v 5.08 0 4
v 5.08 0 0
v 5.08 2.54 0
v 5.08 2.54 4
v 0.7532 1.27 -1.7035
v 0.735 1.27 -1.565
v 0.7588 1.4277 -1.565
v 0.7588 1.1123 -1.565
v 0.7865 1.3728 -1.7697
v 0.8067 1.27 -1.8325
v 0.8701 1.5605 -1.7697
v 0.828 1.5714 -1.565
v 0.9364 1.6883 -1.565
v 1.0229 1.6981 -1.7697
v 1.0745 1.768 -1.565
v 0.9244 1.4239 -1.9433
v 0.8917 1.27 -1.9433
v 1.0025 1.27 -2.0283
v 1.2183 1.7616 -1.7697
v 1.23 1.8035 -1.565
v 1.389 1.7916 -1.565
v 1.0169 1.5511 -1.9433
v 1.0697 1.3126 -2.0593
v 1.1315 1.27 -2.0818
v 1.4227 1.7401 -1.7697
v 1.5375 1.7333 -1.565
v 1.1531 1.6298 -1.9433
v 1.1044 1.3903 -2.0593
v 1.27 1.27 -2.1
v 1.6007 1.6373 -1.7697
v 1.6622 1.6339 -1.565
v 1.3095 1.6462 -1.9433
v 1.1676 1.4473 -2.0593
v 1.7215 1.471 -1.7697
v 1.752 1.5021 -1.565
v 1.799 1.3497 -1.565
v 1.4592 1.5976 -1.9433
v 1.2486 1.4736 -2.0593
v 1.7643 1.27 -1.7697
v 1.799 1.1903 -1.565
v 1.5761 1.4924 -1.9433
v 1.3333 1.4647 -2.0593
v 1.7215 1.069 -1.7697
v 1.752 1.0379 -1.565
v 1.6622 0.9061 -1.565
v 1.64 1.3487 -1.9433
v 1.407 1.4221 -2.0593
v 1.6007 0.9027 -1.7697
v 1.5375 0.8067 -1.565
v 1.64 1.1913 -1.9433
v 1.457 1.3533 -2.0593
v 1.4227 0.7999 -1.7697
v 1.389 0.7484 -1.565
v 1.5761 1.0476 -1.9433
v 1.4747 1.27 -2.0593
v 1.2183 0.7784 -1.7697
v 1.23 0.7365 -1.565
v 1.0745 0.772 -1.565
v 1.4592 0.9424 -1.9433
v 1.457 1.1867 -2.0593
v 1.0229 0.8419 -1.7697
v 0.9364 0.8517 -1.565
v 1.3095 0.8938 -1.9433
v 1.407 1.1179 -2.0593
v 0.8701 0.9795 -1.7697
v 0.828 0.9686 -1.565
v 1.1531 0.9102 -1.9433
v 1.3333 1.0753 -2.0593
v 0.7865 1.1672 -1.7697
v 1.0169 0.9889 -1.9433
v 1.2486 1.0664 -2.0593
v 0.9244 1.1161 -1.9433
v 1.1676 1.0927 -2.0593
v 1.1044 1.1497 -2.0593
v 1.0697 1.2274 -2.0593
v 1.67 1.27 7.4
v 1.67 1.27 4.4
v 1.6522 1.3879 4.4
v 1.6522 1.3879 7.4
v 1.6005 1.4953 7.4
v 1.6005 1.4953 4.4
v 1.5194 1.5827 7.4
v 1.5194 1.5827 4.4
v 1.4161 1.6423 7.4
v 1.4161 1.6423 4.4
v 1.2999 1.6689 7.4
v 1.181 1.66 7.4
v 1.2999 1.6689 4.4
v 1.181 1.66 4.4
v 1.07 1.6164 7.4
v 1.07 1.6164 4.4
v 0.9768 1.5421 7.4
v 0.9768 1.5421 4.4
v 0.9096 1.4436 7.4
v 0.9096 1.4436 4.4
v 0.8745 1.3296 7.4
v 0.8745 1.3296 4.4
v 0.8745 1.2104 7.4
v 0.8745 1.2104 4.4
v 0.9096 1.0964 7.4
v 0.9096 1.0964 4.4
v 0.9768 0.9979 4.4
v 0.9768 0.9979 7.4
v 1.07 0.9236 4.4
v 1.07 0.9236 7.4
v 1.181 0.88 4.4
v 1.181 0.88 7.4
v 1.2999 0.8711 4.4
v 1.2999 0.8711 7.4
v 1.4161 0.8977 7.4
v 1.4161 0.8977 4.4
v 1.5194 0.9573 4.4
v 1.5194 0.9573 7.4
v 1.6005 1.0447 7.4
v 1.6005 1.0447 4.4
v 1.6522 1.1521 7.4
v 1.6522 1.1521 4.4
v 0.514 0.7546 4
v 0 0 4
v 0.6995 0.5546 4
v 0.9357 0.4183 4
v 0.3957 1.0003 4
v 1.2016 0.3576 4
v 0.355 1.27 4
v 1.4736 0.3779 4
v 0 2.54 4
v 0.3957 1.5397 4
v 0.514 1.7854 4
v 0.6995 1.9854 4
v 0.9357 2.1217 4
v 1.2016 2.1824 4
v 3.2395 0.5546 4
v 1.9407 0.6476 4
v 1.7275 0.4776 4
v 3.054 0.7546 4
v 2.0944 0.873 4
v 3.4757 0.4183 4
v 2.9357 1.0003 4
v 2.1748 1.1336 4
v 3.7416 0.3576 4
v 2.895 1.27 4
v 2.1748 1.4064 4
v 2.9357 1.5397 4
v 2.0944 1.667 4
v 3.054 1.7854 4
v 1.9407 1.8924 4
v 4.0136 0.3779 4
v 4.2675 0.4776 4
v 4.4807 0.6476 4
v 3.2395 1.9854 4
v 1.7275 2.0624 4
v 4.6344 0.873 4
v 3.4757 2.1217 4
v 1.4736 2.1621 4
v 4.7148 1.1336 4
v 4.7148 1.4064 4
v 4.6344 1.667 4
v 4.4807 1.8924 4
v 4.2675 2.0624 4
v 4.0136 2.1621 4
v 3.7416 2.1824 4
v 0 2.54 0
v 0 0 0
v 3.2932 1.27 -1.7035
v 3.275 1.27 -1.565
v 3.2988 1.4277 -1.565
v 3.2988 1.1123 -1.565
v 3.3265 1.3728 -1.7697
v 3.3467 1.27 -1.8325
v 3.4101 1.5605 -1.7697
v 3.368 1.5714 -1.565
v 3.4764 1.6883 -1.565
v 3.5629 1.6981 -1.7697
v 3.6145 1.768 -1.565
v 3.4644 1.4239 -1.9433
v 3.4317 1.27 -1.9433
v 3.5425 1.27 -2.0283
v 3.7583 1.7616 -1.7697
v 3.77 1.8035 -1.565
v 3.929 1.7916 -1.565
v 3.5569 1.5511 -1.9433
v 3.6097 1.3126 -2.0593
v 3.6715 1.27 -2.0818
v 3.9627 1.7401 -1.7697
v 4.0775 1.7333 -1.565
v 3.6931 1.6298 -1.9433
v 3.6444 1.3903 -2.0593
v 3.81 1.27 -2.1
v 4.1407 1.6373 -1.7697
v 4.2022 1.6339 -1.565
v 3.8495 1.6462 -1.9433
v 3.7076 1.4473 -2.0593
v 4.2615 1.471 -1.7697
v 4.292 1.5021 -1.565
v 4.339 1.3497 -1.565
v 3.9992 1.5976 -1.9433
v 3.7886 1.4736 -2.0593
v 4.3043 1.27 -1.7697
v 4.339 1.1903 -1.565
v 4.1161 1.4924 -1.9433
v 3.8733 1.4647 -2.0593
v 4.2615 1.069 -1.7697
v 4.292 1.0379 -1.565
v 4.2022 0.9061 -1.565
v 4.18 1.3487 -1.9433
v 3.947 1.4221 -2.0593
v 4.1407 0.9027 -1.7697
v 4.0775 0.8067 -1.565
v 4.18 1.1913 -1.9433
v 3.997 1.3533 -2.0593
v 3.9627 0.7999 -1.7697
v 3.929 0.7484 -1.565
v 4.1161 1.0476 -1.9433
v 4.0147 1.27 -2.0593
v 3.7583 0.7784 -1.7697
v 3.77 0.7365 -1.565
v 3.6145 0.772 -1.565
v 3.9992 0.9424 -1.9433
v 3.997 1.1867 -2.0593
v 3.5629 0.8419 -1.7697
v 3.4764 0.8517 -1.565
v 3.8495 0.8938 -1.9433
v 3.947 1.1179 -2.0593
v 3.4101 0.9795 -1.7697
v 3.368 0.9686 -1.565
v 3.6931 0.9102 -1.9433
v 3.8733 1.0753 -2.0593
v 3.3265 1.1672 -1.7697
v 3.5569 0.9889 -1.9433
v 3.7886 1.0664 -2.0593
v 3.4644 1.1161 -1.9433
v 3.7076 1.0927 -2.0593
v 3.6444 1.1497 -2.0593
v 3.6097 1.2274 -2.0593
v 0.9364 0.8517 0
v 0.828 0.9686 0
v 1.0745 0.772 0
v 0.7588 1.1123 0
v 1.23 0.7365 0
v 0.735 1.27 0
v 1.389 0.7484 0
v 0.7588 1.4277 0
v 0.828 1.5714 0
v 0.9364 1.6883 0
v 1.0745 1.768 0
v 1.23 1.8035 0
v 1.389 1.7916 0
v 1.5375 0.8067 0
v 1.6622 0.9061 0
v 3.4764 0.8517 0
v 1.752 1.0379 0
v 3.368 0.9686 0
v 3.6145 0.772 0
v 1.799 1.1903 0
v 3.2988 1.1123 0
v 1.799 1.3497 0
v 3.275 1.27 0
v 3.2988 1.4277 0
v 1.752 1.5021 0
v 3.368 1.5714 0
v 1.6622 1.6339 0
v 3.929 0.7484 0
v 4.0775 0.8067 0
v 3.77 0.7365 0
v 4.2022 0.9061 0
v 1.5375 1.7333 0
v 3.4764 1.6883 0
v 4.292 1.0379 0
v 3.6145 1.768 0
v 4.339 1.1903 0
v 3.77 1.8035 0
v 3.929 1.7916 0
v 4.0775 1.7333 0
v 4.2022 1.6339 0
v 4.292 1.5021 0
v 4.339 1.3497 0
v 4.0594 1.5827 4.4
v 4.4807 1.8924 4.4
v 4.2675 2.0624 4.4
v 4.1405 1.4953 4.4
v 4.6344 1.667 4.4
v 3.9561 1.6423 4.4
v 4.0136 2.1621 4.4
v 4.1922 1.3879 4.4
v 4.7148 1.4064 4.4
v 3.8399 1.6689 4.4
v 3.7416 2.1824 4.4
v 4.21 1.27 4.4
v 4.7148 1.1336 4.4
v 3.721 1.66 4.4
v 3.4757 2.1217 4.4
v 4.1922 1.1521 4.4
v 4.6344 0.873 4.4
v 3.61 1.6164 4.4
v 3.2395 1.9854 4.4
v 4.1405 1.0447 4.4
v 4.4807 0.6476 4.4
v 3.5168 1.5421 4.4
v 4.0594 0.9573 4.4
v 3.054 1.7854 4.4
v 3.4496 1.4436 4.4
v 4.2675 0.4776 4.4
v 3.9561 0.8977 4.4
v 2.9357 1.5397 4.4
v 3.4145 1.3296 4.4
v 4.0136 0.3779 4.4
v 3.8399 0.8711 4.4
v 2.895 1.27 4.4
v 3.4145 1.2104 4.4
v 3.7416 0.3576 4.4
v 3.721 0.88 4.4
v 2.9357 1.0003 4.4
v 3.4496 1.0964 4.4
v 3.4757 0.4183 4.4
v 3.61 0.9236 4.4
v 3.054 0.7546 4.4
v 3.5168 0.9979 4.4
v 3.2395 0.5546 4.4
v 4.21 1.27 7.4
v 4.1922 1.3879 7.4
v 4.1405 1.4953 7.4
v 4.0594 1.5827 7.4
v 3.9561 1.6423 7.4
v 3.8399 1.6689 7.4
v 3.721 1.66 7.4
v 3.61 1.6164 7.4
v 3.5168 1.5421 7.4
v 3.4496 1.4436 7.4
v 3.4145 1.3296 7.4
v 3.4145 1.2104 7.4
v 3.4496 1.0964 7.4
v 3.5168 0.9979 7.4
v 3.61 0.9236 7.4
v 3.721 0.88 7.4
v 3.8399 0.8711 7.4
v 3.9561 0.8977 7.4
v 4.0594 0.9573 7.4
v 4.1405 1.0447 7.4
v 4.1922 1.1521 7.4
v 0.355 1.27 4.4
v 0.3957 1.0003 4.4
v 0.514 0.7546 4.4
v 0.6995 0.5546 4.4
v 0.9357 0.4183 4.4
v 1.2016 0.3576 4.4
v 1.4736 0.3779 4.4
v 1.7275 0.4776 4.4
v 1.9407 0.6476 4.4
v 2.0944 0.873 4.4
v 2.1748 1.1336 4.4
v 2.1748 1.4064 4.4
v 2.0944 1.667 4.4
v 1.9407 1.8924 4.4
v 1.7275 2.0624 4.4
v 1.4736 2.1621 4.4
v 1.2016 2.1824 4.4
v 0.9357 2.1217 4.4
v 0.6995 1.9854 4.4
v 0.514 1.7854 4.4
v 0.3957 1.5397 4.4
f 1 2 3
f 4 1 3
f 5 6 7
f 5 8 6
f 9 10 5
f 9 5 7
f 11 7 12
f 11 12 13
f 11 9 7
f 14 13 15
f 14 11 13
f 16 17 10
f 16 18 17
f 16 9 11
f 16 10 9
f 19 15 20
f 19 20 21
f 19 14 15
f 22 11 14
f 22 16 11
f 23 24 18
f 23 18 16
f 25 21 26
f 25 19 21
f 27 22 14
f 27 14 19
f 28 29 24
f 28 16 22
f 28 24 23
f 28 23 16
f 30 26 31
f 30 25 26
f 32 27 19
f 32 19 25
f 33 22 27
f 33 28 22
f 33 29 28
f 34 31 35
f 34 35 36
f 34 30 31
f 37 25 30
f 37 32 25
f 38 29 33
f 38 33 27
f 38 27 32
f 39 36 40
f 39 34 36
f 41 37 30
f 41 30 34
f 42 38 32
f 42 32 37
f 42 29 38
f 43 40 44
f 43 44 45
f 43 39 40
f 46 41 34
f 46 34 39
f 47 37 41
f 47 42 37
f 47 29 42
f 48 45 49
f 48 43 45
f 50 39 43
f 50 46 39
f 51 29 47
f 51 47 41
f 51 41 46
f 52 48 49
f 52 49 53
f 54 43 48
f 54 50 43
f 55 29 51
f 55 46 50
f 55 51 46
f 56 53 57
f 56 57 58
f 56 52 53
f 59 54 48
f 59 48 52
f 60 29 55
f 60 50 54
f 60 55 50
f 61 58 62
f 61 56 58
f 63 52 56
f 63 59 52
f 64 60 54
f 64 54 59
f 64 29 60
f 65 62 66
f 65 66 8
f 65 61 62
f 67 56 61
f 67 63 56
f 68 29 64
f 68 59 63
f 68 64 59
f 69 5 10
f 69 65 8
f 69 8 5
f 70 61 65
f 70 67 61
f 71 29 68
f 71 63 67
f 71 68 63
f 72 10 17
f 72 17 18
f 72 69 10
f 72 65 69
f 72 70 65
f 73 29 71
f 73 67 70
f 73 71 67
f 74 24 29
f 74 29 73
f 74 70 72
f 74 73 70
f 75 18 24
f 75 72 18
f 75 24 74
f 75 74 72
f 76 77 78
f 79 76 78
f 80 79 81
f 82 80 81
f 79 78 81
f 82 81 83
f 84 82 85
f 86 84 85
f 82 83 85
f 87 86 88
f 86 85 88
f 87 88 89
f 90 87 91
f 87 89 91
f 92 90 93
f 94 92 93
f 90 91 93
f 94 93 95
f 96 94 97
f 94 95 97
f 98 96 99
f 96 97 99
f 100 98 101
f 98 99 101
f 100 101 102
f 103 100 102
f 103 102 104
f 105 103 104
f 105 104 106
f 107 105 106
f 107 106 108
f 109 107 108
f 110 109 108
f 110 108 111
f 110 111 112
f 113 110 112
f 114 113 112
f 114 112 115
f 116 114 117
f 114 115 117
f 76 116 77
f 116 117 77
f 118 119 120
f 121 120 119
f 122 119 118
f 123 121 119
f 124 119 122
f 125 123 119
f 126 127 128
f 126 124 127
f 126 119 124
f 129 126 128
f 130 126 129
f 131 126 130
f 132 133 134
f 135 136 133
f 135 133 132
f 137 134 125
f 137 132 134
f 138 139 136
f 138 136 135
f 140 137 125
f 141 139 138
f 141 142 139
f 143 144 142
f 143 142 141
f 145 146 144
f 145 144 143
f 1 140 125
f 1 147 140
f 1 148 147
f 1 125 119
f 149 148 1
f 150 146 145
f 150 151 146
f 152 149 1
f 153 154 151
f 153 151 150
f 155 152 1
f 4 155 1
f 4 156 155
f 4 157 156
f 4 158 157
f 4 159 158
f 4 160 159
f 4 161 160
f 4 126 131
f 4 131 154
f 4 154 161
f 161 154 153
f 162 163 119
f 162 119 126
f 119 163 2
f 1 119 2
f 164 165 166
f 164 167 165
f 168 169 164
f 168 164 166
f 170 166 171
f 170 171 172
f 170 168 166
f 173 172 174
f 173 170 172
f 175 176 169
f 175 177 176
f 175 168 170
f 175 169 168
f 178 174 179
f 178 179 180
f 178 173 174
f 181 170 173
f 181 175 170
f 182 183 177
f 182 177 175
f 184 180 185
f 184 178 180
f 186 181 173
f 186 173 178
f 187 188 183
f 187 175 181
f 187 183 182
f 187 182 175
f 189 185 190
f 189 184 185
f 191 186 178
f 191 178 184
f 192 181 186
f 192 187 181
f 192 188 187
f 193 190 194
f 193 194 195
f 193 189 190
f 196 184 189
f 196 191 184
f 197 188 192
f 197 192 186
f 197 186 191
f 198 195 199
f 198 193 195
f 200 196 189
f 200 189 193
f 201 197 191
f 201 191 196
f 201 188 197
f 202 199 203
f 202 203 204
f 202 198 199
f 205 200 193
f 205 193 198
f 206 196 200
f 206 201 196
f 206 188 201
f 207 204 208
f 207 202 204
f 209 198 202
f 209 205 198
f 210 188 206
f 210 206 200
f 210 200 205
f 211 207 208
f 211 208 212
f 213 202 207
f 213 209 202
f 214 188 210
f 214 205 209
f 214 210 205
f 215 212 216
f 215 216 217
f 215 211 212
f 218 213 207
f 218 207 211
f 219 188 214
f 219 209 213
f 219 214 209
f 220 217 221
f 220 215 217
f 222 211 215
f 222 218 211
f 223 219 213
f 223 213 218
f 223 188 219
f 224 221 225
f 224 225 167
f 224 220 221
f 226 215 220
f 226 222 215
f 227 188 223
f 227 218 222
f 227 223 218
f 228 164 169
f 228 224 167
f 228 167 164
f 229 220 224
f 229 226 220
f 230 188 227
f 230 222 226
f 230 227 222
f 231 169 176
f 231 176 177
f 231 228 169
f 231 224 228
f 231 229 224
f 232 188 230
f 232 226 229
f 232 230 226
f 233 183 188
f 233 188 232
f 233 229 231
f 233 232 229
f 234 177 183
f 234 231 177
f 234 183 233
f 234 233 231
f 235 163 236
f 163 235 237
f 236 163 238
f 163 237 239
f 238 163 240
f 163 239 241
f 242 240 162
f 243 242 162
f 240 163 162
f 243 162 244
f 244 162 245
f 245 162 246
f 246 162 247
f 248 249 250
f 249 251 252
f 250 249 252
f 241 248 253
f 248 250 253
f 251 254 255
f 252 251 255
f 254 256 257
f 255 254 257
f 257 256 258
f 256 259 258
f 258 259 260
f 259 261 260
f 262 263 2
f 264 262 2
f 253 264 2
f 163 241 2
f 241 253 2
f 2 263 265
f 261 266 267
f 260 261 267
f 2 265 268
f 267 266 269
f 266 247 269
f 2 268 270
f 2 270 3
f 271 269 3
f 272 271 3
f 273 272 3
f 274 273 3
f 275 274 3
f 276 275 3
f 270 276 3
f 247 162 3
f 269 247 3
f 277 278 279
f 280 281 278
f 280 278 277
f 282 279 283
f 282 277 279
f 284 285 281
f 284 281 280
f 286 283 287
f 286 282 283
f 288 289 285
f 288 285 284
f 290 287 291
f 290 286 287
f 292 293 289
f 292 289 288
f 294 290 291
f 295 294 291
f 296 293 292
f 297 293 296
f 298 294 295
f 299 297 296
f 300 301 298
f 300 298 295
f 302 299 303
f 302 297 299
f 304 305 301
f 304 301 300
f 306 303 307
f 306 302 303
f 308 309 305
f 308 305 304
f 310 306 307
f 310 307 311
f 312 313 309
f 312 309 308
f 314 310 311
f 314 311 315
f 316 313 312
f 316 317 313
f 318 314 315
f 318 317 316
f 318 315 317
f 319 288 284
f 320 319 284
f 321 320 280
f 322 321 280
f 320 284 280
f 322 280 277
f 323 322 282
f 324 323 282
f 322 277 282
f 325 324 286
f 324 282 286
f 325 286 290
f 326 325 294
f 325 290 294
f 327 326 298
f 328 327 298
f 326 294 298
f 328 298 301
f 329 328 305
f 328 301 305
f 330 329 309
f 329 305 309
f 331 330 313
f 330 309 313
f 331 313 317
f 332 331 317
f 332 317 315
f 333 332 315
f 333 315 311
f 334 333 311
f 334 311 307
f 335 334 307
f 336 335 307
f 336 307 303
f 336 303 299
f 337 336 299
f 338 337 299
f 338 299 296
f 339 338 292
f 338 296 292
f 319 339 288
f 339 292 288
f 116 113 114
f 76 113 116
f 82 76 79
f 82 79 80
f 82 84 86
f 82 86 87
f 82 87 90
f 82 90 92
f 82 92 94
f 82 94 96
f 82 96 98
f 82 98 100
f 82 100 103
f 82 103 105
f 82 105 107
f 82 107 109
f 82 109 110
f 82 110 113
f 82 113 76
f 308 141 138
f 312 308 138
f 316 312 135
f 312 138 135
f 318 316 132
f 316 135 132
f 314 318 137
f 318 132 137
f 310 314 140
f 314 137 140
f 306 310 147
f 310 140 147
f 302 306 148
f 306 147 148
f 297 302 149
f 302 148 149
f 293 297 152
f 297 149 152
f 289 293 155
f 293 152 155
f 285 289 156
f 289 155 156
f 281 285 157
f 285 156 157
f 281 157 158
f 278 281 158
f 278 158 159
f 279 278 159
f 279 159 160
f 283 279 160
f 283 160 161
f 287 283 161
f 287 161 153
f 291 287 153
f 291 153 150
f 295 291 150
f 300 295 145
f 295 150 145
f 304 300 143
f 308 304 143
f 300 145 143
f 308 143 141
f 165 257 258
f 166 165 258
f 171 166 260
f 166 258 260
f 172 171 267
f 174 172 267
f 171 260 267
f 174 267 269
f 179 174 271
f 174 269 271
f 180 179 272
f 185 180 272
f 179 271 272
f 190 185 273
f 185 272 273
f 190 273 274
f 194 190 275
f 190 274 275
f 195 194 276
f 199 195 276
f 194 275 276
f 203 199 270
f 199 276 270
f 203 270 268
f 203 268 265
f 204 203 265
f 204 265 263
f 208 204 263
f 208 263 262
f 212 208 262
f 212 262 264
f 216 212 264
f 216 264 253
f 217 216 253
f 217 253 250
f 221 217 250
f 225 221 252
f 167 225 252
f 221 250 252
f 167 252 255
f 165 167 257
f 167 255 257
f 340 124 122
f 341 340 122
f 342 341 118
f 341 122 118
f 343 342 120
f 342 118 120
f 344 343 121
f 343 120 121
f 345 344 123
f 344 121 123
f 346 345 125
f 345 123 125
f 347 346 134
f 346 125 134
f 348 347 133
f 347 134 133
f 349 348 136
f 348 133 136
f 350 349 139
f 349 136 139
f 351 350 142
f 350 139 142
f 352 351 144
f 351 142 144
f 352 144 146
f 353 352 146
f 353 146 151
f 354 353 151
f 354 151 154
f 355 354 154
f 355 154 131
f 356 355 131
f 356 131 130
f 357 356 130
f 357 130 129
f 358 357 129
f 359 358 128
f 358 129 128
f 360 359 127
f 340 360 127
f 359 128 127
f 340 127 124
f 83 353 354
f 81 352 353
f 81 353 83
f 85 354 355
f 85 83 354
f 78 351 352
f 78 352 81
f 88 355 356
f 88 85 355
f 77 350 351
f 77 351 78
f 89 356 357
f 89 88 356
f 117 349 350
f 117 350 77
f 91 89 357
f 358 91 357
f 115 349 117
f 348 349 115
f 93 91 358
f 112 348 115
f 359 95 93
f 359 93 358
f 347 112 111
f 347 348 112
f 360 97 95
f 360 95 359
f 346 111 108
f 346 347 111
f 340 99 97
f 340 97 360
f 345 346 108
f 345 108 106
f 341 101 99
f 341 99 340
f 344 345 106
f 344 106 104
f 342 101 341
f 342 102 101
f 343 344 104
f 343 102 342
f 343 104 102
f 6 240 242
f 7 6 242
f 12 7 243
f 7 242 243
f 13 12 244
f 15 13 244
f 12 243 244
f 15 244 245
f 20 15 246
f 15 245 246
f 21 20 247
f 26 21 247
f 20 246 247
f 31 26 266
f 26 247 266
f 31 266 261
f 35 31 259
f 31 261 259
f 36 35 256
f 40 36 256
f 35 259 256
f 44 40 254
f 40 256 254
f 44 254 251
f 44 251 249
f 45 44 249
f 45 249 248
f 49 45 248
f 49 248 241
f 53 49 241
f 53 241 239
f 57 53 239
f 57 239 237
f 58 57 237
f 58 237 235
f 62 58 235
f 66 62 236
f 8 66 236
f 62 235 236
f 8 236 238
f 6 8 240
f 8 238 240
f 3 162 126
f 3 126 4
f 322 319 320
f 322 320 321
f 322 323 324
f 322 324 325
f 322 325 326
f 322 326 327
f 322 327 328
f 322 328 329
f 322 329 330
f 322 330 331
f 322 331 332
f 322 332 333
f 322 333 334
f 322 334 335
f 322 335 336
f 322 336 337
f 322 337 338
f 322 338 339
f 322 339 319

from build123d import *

# Parameters (mm, degrees)
ESQUISSE1_W       = 5.08
ESQUISSE1_H       = 2.54
EXTRUSION1_DEPTH  = 4
ESQUISSE2_R       = 0.915
EXTRUSION2_DEPTH  = 0.4
ESQUISSE3_R       = 0.535
EXTRUSION3_DEPTH  = 1.565
D_ME1_FACE_RADIUS = 0.535
D_ME1_HEIGHT      = 0.535
D_ME2_FACE_RADIUS = 0.535
D_ME2_HEIGHT      = 0.535
ESQUISSE4_R       = 0.4
EXTRUSION4_DEPTH  = 3


with BuildPart() as part:
    # Esquisse1 → Extrusion1 (new body)
    with BuildSketch(Plane.XY):
        with Locations((2.54, 1.27)):
            Rectangle(ESQUISSE1_W, ESQUISSE1_H)
    extrude(amount=EXTRUSION1_DEPTH)

    # Esquisse2 → Extrusion2 (add)
    with BuildSketch(Plane.XY.offset(4)):
        with Locations(Location((3.81, 1.27, 0), (0, 0, 180))):
            Circle(ESQUISSE2_R)
        with Locations(Location((1.27, 1.27, 0), (0, 0, 180))):
            Circle(ESQUISSE2_R)
    extrude(amount=EXTRUSION2_DEPTH)

    # Esquisse3 → Extrusion3 (add)
    with BuildSketch(Plane(origin=(0, 0, 0), x_dir=(-1, 0, 0), z_dir=(0, 0, -1))):
        with Locations((-3.81, 1.27)):
            Circle(ESQUISSE3_R)
        with Locations((-1.27, 1.27)):
            Circle(ESQUISSE3_R)
    extrude(amount=EXTRUSION3_DEPTH)

    # Dôme1: a dome of height H over a round flat face of radius A is a cap of a sphere of radius (A * A + H * H) / (2 * H)
    d_me1_r = (D_ME1_FACE_RADIUS * D_ME1_FACE_RADIUS + D_ME1_HEIGHT * D_ME1_HEIGHT) / (2 * D_ME1_HEIGHT)
    d_me1_base = Plane((3.81, 1.27, -1.565), z_dir=(0, 0, -1))
    with Locations(d_me1_base.offset(D_ME1_HEIGHT - d_me1_r)):
        d_me1_ball = Sphere(d_me1_r, mode=Mode.PRIVATE)
    add(split(d_me1_ball, bisect_by=d_me1_base, keep=Keep.TOP, mode=Mode.PRIVATE))

    # Dôme2: a dome of height H over a round flat face of radius A is a cap of a sphere of radius (A * A + H * H) / (2 * H)
    d_me2_r = (D_ME2_FACE_RADIUS * D_ME2_FACE_RADIUS + D_ME2_HEIGHT * D_ME2_HEIGHT) / (2 * D_ME2_HEIGHT)
    d_me2_base = Plane((1.27, 1.27, -1.565), z_dir=(0, 0, -1))
    with Locations(d_me2_base.offset(D_ME2_HEIGHT - d_me2_r)):
        d_me2_ball = Sphere(d_me2_r, mode=Mode.PRIVATE)
    add(split(d_me2_ball, bisect_by=d_me2_base, keep=Keep.TOP, mode=Mode.PRIVATE))

    # Esquisse4 → Extrusion4 (add)
    with BuildSketch(Plane.XY.offset(4.4)):
        with Locations((3.81, 1.27)):
            Circle(ESQUISSE4_R)
        with Locations((1.27, 1.27)):
            Circle(ESQUISSE4_R)
    extrude(amount=EXTRUSION4_DEPTH)


solid = part.part
